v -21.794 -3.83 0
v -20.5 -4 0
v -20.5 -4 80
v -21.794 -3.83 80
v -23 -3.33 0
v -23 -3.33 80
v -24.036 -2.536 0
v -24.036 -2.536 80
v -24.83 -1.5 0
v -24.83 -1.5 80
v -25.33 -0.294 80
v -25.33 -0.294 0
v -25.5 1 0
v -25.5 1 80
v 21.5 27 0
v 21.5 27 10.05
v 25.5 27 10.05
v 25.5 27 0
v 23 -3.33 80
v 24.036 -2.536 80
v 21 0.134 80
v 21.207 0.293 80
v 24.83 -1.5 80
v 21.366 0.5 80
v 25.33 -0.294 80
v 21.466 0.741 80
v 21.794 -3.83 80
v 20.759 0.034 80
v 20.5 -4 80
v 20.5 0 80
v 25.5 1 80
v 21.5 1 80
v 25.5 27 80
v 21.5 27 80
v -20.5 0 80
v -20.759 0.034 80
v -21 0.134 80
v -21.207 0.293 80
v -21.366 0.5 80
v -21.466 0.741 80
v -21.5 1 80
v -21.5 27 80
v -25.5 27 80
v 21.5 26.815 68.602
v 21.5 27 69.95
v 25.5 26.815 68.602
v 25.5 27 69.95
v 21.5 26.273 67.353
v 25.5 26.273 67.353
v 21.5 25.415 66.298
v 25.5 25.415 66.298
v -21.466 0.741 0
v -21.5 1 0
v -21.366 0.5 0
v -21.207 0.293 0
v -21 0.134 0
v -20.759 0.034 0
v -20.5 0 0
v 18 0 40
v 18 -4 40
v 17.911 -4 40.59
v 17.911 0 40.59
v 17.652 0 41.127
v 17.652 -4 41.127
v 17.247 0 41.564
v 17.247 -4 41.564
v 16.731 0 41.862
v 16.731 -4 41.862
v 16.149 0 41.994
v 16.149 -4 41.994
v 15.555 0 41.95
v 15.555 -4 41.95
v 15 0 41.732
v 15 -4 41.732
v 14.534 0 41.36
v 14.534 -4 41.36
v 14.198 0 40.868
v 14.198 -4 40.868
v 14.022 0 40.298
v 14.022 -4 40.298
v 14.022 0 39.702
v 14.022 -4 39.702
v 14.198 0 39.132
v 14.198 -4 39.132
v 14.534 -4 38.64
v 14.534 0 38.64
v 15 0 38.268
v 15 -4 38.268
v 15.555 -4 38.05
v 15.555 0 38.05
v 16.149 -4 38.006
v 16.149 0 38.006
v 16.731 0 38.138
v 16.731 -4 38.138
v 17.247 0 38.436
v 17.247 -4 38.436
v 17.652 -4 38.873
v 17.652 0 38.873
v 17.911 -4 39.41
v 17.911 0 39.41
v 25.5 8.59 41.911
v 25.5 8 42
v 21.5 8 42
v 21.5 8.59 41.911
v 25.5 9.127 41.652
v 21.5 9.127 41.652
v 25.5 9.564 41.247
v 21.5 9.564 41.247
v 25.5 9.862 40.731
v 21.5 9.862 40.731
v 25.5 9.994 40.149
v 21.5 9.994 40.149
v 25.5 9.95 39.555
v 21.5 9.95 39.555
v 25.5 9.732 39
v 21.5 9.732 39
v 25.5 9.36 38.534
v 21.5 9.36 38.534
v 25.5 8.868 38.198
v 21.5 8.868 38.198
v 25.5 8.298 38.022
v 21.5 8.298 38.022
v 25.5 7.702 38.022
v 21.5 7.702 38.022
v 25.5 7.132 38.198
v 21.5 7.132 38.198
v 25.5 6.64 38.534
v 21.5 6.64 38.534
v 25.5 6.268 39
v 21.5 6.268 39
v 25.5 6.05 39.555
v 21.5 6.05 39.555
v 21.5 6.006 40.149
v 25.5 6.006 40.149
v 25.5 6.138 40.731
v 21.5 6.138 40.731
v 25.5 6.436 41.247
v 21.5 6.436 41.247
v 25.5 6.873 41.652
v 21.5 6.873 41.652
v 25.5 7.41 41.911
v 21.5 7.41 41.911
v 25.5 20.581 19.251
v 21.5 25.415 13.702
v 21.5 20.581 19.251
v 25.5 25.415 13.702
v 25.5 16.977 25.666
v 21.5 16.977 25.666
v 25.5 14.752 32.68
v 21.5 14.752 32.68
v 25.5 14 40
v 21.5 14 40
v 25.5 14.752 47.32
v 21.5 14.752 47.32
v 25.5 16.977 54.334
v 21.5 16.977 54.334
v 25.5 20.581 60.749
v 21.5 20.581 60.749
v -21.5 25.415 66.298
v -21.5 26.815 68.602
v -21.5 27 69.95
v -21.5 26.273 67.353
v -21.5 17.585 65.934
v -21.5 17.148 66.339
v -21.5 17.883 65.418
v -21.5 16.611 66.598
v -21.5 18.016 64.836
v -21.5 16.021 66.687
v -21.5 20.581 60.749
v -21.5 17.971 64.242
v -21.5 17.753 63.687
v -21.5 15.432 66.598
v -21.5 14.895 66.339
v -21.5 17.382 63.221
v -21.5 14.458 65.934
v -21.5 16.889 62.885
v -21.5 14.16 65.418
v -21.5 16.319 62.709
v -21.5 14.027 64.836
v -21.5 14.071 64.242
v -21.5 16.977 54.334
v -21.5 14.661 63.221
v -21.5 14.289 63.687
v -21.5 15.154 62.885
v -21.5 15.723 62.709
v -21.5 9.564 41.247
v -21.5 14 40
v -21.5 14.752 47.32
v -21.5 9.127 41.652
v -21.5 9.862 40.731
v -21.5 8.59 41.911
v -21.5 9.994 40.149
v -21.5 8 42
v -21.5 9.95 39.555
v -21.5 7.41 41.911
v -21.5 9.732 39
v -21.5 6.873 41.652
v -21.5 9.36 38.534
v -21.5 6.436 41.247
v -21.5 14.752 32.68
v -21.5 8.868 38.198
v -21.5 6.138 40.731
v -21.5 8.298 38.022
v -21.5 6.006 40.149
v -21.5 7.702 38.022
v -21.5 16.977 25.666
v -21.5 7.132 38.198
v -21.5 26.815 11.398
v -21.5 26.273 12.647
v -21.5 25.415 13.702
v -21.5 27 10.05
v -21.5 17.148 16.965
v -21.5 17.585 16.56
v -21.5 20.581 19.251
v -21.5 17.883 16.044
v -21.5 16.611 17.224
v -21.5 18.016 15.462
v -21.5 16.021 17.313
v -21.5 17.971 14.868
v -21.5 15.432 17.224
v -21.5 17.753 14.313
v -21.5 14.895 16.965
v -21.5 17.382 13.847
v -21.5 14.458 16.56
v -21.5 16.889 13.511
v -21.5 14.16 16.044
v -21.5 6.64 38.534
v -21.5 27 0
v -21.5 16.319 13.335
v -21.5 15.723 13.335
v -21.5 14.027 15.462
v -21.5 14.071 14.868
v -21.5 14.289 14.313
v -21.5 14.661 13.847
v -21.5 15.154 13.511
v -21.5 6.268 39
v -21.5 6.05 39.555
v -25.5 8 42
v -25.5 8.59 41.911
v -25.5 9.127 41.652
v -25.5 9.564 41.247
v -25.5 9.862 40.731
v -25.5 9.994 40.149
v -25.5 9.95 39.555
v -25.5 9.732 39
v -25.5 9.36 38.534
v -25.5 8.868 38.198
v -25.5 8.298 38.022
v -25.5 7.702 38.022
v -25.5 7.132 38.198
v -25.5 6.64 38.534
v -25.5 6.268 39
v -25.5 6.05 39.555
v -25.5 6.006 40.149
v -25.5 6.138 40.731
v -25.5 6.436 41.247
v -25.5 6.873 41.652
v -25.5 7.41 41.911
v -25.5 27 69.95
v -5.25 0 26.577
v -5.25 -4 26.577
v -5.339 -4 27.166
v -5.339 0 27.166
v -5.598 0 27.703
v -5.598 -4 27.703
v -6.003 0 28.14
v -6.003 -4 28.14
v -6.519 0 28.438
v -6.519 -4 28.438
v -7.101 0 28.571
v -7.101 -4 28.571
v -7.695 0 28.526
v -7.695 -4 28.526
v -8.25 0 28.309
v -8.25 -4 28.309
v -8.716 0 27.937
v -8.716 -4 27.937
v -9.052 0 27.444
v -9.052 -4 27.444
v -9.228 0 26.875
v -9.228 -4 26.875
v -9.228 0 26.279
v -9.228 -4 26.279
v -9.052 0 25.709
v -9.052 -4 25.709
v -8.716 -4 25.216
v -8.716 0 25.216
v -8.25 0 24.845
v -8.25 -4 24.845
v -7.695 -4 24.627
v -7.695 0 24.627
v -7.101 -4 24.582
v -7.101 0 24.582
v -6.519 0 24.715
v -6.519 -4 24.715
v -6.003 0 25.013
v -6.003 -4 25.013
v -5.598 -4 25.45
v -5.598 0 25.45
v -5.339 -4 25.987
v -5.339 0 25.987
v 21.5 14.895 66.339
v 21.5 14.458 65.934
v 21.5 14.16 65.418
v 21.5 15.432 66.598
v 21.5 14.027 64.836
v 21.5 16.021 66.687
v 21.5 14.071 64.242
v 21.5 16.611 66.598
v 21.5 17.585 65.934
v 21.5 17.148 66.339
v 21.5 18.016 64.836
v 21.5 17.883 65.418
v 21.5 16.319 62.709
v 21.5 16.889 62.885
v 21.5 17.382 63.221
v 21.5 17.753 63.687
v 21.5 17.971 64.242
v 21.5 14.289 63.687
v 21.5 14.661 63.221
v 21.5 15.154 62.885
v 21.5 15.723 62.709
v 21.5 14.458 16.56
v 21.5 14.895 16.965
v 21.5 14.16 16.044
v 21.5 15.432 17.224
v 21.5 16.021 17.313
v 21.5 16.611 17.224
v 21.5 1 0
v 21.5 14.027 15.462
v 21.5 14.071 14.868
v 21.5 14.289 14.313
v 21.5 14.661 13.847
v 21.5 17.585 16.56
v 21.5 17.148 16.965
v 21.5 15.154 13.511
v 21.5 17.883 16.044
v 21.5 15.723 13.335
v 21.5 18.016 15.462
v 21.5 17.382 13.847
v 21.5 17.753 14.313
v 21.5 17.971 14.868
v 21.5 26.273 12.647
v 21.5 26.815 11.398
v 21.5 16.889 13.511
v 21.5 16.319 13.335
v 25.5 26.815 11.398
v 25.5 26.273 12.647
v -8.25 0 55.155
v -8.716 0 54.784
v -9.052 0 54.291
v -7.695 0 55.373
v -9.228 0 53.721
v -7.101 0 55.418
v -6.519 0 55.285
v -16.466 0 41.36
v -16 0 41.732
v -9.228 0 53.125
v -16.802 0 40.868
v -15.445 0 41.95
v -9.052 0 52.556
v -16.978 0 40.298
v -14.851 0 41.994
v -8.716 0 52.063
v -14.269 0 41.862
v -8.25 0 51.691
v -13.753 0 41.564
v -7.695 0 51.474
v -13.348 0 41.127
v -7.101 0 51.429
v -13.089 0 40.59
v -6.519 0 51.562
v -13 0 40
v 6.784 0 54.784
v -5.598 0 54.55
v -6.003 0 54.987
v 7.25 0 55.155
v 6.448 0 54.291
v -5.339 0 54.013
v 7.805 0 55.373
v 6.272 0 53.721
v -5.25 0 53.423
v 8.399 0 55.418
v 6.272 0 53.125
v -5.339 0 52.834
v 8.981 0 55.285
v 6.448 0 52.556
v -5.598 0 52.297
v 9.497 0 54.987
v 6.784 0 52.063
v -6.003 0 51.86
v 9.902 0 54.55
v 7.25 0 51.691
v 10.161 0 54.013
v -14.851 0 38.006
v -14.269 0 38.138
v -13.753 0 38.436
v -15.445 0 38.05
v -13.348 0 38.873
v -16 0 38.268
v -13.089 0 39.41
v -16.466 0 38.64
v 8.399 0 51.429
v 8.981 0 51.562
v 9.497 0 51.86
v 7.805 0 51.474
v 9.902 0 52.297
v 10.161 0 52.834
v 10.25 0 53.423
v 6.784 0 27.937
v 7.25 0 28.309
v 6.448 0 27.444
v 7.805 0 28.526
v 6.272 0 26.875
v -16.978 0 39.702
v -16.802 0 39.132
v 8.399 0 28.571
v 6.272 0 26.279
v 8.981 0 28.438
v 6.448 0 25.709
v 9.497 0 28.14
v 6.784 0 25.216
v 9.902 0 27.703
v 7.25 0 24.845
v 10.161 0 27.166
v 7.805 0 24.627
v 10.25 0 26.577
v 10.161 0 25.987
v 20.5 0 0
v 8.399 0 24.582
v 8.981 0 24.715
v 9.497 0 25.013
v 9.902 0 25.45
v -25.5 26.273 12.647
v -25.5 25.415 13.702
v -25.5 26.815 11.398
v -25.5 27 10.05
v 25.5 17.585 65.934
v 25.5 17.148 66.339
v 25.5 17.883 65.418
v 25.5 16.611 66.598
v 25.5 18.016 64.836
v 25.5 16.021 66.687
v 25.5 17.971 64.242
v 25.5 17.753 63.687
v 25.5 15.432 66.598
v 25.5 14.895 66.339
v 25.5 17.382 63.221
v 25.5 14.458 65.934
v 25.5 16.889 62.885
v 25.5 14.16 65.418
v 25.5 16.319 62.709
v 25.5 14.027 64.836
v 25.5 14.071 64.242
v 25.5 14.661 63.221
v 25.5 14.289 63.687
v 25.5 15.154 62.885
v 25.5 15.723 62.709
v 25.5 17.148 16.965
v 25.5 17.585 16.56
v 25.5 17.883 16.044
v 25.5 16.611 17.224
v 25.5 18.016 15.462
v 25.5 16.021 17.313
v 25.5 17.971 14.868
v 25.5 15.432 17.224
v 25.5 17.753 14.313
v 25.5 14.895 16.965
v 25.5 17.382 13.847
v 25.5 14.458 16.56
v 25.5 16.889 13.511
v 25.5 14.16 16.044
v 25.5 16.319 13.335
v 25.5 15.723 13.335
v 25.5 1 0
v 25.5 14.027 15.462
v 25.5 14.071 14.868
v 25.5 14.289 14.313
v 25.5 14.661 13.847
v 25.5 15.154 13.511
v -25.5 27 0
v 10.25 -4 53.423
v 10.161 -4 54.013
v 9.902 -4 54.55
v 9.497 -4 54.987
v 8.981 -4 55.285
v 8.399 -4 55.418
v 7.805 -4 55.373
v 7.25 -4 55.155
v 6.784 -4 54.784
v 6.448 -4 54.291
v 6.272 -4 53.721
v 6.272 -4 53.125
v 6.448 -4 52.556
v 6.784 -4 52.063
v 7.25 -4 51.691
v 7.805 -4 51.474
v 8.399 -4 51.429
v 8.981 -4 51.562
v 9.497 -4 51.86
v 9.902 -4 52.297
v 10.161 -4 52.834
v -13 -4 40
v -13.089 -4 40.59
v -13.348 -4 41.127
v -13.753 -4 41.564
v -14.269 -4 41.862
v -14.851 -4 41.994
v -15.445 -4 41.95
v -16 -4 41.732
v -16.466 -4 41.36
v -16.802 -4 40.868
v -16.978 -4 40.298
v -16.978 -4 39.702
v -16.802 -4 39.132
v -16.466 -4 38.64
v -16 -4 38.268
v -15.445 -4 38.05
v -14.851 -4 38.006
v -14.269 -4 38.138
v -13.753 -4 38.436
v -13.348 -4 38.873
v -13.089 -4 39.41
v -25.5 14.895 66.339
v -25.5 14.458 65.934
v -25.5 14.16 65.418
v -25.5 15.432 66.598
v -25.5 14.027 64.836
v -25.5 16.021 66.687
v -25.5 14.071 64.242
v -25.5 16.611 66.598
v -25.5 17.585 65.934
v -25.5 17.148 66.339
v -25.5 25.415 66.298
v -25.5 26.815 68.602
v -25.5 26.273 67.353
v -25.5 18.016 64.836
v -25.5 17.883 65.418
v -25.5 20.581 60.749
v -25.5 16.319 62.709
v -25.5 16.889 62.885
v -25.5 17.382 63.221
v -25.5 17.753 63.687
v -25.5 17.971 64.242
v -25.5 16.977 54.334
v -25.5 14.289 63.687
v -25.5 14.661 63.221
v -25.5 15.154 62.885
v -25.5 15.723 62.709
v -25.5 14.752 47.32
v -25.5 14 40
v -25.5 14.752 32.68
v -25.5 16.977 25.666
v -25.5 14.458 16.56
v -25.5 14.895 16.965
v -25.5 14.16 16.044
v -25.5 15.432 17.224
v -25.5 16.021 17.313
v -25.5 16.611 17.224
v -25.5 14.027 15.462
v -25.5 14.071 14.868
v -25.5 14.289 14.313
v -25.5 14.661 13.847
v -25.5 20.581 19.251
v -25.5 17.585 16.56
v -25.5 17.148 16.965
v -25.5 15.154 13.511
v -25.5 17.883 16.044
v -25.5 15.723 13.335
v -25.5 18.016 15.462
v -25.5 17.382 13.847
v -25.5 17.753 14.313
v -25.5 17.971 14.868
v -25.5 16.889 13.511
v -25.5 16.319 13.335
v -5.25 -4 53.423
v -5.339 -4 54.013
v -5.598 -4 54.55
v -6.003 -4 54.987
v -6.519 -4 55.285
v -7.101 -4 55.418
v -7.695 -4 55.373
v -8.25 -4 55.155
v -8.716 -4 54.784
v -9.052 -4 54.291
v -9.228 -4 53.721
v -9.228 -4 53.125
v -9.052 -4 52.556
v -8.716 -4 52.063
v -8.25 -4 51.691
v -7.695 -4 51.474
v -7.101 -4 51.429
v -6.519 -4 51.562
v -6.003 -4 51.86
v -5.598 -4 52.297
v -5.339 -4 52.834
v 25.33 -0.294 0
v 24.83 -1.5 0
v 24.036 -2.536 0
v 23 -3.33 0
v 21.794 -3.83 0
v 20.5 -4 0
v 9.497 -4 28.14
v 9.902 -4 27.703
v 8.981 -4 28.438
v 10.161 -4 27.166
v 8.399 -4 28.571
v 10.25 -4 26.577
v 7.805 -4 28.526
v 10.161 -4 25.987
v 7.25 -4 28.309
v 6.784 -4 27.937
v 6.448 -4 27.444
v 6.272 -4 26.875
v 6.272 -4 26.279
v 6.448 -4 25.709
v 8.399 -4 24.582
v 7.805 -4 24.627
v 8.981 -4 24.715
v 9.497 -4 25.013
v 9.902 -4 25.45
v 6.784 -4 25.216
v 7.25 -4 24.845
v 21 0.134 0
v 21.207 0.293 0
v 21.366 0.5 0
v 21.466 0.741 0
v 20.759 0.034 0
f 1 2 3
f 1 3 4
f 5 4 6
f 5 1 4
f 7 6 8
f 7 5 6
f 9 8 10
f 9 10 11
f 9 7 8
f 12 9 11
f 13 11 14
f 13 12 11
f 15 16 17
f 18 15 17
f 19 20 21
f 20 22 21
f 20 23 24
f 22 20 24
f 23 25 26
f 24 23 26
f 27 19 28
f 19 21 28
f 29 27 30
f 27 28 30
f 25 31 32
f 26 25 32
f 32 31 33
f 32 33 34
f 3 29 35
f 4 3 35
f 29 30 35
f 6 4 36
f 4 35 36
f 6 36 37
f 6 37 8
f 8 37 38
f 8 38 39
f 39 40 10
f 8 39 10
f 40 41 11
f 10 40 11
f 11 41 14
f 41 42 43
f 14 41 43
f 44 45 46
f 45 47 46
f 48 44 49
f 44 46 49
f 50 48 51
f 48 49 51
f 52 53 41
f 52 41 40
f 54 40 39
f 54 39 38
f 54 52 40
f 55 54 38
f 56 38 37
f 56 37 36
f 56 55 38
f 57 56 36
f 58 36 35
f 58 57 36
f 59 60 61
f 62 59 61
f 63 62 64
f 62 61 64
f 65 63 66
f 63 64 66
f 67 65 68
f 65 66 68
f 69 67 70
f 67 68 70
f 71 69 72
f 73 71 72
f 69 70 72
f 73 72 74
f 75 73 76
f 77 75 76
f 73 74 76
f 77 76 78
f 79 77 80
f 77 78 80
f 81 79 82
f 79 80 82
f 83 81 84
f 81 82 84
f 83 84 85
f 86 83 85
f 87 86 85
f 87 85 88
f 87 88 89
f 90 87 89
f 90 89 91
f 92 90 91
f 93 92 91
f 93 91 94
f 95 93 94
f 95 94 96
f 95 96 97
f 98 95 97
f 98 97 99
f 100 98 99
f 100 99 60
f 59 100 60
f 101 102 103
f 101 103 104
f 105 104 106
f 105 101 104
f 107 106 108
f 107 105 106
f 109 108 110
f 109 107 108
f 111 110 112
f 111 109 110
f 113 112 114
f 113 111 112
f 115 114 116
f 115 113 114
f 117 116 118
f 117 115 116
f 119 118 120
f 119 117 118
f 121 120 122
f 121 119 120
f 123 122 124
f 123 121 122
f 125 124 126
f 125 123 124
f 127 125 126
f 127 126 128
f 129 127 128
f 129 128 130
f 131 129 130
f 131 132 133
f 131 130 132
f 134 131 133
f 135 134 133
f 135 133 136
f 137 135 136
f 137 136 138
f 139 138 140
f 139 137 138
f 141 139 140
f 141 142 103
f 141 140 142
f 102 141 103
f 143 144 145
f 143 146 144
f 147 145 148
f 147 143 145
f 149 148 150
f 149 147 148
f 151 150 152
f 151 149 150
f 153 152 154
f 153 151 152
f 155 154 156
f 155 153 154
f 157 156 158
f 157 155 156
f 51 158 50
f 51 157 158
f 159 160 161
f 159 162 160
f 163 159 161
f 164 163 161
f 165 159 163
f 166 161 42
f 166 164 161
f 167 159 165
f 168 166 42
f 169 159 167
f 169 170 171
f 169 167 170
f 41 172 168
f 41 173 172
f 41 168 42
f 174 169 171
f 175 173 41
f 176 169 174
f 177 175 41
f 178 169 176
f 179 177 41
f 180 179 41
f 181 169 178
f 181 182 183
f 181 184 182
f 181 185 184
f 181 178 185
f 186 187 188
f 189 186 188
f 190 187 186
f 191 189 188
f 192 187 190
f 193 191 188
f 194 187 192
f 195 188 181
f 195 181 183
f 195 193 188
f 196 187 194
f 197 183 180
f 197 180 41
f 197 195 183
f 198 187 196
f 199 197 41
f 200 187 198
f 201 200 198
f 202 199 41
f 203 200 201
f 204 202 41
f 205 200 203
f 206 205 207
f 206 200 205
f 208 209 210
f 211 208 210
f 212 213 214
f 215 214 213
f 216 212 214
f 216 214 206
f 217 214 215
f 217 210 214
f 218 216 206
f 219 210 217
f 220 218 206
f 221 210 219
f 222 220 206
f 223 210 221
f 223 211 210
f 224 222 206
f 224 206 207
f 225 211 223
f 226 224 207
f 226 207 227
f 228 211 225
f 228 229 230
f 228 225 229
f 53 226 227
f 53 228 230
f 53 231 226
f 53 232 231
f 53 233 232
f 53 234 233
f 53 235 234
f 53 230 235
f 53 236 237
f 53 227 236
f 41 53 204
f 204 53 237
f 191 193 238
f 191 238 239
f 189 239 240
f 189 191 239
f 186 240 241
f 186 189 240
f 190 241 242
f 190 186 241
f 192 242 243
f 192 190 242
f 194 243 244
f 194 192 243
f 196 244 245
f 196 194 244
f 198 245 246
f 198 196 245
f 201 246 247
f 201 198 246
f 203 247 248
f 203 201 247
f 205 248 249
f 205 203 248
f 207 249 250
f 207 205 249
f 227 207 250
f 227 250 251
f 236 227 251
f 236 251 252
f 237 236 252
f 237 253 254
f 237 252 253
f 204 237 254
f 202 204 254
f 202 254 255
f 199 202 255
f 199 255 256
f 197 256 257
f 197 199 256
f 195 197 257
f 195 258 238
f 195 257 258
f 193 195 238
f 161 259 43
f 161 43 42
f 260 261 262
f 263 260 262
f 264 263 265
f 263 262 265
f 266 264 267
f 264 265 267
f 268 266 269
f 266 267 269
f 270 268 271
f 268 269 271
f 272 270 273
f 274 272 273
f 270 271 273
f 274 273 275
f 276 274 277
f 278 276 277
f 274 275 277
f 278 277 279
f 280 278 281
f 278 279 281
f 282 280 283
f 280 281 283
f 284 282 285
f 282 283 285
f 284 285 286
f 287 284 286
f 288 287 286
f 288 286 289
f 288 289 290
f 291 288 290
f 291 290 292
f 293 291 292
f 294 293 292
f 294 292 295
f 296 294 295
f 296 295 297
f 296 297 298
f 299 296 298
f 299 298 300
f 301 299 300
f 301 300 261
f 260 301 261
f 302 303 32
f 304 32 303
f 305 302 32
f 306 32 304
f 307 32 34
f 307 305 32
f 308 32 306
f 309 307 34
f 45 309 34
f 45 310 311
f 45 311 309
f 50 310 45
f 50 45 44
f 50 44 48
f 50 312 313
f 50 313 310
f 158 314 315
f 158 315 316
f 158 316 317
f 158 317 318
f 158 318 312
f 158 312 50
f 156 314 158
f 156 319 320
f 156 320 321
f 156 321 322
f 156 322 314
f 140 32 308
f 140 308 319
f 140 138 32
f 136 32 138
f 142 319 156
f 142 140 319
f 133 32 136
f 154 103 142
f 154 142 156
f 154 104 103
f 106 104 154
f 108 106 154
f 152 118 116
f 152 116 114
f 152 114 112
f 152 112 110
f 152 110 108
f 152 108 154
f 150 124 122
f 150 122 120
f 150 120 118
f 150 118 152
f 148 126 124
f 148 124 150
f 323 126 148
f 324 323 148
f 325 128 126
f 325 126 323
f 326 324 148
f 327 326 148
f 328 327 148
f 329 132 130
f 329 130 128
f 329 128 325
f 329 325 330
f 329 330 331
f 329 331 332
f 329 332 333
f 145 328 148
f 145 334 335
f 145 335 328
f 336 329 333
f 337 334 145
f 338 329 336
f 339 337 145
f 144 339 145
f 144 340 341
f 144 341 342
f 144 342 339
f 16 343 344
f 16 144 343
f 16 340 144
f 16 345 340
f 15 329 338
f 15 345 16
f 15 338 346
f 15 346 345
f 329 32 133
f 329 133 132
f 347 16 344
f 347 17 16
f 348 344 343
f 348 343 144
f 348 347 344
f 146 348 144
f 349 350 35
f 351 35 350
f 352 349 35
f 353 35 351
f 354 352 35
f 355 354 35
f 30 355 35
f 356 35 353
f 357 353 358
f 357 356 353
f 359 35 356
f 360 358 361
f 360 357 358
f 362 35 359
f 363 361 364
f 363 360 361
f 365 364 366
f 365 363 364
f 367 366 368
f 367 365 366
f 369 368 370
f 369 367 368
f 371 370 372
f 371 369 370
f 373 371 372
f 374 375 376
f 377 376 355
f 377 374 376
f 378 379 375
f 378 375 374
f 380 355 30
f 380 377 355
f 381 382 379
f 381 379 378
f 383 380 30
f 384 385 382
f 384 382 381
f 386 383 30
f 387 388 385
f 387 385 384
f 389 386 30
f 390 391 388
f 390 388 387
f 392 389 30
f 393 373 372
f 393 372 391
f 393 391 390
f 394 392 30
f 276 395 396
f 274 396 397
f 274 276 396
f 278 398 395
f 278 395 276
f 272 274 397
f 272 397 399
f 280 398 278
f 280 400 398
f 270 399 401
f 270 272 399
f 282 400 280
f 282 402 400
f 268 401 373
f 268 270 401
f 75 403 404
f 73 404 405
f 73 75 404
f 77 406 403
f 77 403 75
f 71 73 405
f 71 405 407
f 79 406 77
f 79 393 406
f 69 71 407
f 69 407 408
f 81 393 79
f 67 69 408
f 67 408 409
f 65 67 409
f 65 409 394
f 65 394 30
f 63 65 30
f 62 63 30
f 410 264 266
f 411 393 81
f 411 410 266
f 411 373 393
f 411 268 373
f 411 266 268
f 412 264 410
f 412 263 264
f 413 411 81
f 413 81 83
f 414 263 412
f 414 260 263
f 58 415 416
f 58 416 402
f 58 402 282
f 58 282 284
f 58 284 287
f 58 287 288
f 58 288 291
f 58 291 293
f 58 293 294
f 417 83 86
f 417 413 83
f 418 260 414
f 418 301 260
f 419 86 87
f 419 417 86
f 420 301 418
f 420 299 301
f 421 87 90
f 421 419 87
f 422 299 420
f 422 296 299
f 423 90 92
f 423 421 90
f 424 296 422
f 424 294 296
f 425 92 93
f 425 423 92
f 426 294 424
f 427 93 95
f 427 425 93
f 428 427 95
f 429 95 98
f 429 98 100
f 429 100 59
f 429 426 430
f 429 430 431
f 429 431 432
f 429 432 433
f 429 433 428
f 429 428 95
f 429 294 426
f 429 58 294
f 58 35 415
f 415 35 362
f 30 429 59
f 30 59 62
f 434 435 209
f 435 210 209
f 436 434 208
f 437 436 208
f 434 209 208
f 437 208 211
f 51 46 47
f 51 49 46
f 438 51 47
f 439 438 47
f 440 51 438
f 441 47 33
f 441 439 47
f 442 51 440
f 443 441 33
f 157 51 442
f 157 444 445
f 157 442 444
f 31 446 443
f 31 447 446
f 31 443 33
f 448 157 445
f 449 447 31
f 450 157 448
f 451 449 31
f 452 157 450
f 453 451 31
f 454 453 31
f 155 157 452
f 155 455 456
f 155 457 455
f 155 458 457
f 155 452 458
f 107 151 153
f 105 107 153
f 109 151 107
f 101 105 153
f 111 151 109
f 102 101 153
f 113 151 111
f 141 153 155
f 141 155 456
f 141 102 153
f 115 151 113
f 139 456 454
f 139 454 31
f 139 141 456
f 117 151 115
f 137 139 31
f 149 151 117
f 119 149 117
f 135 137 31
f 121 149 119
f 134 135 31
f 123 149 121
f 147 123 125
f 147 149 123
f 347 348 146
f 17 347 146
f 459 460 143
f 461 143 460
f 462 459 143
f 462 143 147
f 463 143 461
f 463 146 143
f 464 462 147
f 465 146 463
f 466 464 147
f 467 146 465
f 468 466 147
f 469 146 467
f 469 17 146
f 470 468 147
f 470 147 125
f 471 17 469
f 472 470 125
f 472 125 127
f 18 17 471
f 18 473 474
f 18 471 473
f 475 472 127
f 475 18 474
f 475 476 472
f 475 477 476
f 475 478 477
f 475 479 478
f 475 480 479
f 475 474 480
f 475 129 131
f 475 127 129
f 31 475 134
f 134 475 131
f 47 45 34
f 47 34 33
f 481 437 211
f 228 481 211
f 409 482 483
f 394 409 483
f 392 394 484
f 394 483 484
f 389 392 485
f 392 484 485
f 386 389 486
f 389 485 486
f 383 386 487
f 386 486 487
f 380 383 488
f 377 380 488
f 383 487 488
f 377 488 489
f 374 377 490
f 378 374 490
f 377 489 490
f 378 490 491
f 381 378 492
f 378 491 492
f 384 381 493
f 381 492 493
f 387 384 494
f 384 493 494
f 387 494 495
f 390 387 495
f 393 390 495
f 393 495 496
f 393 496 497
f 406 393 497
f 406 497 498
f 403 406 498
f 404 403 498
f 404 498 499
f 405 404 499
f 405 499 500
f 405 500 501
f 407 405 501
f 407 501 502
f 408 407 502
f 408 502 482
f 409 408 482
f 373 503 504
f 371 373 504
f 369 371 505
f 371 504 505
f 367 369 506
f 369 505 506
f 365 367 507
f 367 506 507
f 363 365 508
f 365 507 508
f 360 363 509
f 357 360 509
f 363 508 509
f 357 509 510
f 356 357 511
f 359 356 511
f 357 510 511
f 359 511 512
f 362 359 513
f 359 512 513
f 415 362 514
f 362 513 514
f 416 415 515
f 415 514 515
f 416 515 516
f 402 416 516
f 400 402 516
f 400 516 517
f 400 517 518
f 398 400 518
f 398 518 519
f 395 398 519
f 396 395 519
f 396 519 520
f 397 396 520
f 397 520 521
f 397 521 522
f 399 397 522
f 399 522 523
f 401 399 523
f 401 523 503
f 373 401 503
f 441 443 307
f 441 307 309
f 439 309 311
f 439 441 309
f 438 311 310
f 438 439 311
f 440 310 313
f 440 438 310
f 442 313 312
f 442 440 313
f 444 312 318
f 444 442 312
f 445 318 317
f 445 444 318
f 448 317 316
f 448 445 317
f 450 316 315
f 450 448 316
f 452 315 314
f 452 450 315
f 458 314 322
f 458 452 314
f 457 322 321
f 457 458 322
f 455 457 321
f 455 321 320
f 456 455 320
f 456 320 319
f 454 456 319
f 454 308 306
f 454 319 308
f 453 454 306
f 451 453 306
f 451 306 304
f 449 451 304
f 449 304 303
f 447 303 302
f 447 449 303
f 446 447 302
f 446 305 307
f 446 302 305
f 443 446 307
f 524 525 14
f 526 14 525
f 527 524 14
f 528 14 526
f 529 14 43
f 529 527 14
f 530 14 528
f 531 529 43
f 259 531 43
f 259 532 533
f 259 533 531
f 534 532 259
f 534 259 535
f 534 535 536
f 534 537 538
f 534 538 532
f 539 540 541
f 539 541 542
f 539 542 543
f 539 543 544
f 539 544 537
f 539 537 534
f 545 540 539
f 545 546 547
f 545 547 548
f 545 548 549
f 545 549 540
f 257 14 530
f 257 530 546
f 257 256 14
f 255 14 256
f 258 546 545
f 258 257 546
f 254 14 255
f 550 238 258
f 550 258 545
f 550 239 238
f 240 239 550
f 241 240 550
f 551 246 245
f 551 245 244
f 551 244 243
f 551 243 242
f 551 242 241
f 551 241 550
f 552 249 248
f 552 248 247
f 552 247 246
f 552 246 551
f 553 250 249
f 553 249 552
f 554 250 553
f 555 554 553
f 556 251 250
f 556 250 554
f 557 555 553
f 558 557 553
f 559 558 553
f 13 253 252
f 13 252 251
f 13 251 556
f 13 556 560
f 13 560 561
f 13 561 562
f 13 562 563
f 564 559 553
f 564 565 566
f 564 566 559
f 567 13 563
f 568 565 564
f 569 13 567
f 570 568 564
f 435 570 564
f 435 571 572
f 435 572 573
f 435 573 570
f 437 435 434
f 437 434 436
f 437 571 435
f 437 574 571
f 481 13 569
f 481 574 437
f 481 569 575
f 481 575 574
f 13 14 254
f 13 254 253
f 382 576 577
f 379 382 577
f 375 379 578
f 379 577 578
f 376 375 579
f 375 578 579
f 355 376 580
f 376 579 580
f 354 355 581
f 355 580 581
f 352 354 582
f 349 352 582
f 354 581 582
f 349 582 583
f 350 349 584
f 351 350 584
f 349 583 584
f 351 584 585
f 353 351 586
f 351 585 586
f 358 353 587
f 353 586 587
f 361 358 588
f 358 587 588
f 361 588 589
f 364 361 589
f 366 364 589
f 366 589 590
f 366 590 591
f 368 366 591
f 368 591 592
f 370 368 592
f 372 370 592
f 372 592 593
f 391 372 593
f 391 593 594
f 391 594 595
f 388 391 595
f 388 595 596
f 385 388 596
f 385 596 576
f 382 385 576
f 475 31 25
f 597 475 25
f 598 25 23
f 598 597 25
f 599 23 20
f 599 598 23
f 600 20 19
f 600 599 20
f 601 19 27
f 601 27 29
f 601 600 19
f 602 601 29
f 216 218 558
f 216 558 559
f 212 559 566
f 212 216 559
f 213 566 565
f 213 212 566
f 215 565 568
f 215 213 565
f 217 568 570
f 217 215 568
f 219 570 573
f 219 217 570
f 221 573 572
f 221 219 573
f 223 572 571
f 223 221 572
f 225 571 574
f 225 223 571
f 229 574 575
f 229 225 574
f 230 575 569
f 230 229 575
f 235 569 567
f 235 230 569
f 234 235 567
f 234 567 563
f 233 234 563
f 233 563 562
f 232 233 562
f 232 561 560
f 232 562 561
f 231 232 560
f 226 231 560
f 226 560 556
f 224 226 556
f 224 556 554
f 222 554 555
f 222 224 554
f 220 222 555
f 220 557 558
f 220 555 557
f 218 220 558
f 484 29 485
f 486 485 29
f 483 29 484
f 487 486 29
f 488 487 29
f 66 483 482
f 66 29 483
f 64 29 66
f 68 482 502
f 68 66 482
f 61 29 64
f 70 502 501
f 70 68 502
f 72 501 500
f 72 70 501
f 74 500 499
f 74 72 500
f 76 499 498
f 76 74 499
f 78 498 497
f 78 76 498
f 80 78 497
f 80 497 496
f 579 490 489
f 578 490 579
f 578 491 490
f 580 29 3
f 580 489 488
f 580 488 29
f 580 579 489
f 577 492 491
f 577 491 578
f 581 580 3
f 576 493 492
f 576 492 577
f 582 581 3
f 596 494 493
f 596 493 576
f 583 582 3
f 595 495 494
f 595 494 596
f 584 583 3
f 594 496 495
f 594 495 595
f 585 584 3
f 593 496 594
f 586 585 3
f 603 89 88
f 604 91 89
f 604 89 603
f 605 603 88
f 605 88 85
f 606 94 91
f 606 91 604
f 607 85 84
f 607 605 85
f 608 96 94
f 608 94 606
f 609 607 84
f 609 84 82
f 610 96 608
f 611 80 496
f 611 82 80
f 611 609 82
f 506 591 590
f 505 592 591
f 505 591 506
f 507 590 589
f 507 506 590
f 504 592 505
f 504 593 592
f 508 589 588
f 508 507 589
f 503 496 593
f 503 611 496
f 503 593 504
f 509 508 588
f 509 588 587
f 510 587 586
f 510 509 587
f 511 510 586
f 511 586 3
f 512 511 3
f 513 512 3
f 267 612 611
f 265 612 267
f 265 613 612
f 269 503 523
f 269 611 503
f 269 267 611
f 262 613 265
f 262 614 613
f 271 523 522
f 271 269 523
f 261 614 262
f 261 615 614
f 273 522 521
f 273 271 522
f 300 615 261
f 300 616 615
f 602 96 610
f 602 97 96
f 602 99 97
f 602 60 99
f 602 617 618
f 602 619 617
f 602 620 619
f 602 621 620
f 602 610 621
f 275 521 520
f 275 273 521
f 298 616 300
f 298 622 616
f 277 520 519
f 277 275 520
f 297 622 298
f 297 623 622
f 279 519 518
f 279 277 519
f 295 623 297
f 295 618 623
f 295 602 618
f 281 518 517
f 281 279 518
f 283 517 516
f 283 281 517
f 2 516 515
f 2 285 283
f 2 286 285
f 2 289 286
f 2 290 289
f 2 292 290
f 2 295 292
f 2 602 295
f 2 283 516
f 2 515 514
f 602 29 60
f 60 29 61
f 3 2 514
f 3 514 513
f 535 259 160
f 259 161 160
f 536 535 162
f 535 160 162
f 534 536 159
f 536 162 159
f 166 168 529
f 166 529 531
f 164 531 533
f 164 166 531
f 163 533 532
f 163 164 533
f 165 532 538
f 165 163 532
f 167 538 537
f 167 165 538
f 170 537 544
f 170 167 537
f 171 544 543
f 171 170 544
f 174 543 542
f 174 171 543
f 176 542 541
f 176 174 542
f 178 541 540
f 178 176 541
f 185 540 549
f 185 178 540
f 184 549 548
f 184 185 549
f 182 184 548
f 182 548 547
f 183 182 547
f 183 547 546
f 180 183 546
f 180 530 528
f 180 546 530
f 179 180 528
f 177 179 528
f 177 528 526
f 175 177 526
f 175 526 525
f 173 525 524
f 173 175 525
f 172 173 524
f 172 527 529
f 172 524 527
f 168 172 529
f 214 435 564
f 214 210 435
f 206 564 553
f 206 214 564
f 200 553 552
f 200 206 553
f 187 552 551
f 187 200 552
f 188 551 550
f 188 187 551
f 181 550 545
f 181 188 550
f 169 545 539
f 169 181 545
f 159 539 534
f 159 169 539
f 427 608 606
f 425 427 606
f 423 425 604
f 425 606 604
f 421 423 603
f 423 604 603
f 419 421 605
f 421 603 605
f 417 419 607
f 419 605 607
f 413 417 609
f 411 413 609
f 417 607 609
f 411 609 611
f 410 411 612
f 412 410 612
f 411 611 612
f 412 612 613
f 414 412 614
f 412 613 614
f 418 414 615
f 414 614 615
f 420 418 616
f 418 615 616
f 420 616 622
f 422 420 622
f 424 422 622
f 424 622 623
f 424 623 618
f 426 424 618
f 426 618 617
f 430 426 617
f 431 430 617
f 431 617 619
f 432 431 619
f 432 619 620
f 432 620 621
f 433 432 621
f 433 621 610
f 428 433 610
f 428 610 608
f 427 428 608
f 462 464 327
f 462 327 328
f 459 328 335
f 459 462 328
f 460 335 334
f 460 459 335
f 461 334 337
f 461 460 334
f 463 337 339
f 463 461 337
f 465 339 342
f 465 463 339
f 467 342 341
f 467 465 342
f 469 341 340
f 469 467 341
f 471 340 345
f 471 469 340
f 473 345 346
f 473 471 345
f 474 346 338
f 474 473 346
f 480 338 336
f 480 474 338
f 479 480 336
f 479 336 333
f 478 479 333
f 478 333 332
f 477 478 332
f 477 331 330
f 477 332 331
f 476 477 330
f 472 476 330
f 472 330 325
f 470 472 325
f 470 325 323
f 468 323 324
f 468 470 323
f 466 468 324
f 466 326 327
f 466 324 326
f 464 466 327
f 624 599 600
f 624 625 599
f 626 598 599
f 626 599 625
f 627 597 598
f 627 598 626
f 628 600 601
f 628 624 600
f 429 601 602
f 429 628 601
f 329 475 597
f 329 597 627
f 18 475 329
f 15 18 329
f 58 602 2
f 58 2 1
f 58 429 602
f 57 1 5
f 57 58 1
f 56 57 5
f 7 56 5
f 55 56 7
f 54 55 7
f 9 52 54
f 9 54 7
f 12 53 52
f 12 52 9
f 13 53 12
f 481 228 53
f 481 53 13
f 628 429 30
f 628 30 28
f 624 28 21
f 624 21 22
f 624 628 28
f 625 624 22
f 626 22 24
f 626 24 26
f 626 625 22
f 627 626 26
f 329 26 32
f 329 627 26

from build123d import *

# Parameters (mm, degrees)
SM_BASE_FLANGE_1_DEPTH   = 80
CUT_EXTRUDE_3_DEPTH      = 99.640762365
CUT_EXTRUDE_3_DEPTH_BACK = 99.640762365
SKETCH_6_R               = 36
SKETCH_6_R_2             = 2
FILLET_1_R               = 5
SKETCH_9_R               = 2
CUT_EXTRUDE_4_DEPTH      = 90.505586418


# Sheet-metal steps are written as plain solids
with BuildPart() as part:
    # Sketch 1 → Базовая кромка1 (new body)
    with BuildSketch(Plane.XY):
        with BuildLine():
            Line((-21.5, 27), (-21.5, 1))
            ThreePointArc((-21.5, 1), (-21.207106781, 0.292893219), (-20.5, 0))
            Line((-20.5, 0), (20.5, 0))
            ThreePointArc((20.5, 0), (21.207106781, 0.292893219), (21.5, 1))
            Line((21.5, 1), (21.5, 27))
            Line((21.5, 27), (25.5, 27))
            Line((25.5, 27), (25.5, 1))
            ThreePointArc((25.5, 1), (24.035533906, -2.535533906), (20.5, -4))
            Line((20.5, -4), (-20.5, -4))
            ThreePointArc((-20.5, -4), (-24.035533906, -2.535533906), (-25.5, 1))
            Line((-25.5, 1), (-25.5, 27))
            Line((-25.5, 27), (-21.5, 27))
        make_face()
    extrude(amount=SM_BASE_FLANGE_1_DEPTH)

    # Эскиз6 → Вырез-Вытянуть3 (cut, two sides: drawn at the far end of the back side and taken through both)
    with BuildSketch(Plane.ZY.offset(25.5).offset(-CUT_EXTRUDE_3_DEPTH_BACK)):
        with Locations((40, 50)):
            Circle(SKETCH_6_R)
        with Locations((40, 8)):
            Circle(SKETCH_6_R_2)
        with Locations((15.313019404, 16.021286236)):
            Circle(SKETCH_6_R_2)
        with Locations((64.686980596, 16.021286236)):
            Circle(SKETCH_6_R_2)
    extrude(amount=CUT_EXTRUDE_3_DEPTH + CUT_EXTRUDE_3_DEPTH_BACK, mode=Mode.SUBTRACT)

    # Скругление1
    fillet_1_edges = [part.edges().sort_by_distance(p)[0] for p in [
        (23.5, 27, 12.305235152),
        (23.5, 27, 67.694764848),
        (-23.5, 27, 12.305235152),
        (-23.5, 27, 67.694764848),
    ]]
    fillet(fillet_1_edges, radius=FILLET_1_R)

    # Эскиз9 → Вырез-Вытянуть4 (cut, through all)
    with BuildSketch(Plane.XZ.offset(4)):
        with Locations((16, 40)):
            Circle(SKETCH_9_R)
        with Locations((8.25, 26.576606241)):
            Circle(SKETCH_9_R)
        with Locations((-7.25, 26.576606241)):
            Circle(SKETCH_9_R)
        with Locations((-15, 40)):
            Circle(SKETCH_9_R)
        with Locations((-7.25, 53.423393759)):
            Circle(SKETCH_9_R)
        with Locations((8.25, 53.423393759)):
            Circle(SKETCH_9_R)
    extrude(amount=-CUT_EXTRUDE_4_DEPTH, mode=Mode.SUBTRACT)


solid = part.part
